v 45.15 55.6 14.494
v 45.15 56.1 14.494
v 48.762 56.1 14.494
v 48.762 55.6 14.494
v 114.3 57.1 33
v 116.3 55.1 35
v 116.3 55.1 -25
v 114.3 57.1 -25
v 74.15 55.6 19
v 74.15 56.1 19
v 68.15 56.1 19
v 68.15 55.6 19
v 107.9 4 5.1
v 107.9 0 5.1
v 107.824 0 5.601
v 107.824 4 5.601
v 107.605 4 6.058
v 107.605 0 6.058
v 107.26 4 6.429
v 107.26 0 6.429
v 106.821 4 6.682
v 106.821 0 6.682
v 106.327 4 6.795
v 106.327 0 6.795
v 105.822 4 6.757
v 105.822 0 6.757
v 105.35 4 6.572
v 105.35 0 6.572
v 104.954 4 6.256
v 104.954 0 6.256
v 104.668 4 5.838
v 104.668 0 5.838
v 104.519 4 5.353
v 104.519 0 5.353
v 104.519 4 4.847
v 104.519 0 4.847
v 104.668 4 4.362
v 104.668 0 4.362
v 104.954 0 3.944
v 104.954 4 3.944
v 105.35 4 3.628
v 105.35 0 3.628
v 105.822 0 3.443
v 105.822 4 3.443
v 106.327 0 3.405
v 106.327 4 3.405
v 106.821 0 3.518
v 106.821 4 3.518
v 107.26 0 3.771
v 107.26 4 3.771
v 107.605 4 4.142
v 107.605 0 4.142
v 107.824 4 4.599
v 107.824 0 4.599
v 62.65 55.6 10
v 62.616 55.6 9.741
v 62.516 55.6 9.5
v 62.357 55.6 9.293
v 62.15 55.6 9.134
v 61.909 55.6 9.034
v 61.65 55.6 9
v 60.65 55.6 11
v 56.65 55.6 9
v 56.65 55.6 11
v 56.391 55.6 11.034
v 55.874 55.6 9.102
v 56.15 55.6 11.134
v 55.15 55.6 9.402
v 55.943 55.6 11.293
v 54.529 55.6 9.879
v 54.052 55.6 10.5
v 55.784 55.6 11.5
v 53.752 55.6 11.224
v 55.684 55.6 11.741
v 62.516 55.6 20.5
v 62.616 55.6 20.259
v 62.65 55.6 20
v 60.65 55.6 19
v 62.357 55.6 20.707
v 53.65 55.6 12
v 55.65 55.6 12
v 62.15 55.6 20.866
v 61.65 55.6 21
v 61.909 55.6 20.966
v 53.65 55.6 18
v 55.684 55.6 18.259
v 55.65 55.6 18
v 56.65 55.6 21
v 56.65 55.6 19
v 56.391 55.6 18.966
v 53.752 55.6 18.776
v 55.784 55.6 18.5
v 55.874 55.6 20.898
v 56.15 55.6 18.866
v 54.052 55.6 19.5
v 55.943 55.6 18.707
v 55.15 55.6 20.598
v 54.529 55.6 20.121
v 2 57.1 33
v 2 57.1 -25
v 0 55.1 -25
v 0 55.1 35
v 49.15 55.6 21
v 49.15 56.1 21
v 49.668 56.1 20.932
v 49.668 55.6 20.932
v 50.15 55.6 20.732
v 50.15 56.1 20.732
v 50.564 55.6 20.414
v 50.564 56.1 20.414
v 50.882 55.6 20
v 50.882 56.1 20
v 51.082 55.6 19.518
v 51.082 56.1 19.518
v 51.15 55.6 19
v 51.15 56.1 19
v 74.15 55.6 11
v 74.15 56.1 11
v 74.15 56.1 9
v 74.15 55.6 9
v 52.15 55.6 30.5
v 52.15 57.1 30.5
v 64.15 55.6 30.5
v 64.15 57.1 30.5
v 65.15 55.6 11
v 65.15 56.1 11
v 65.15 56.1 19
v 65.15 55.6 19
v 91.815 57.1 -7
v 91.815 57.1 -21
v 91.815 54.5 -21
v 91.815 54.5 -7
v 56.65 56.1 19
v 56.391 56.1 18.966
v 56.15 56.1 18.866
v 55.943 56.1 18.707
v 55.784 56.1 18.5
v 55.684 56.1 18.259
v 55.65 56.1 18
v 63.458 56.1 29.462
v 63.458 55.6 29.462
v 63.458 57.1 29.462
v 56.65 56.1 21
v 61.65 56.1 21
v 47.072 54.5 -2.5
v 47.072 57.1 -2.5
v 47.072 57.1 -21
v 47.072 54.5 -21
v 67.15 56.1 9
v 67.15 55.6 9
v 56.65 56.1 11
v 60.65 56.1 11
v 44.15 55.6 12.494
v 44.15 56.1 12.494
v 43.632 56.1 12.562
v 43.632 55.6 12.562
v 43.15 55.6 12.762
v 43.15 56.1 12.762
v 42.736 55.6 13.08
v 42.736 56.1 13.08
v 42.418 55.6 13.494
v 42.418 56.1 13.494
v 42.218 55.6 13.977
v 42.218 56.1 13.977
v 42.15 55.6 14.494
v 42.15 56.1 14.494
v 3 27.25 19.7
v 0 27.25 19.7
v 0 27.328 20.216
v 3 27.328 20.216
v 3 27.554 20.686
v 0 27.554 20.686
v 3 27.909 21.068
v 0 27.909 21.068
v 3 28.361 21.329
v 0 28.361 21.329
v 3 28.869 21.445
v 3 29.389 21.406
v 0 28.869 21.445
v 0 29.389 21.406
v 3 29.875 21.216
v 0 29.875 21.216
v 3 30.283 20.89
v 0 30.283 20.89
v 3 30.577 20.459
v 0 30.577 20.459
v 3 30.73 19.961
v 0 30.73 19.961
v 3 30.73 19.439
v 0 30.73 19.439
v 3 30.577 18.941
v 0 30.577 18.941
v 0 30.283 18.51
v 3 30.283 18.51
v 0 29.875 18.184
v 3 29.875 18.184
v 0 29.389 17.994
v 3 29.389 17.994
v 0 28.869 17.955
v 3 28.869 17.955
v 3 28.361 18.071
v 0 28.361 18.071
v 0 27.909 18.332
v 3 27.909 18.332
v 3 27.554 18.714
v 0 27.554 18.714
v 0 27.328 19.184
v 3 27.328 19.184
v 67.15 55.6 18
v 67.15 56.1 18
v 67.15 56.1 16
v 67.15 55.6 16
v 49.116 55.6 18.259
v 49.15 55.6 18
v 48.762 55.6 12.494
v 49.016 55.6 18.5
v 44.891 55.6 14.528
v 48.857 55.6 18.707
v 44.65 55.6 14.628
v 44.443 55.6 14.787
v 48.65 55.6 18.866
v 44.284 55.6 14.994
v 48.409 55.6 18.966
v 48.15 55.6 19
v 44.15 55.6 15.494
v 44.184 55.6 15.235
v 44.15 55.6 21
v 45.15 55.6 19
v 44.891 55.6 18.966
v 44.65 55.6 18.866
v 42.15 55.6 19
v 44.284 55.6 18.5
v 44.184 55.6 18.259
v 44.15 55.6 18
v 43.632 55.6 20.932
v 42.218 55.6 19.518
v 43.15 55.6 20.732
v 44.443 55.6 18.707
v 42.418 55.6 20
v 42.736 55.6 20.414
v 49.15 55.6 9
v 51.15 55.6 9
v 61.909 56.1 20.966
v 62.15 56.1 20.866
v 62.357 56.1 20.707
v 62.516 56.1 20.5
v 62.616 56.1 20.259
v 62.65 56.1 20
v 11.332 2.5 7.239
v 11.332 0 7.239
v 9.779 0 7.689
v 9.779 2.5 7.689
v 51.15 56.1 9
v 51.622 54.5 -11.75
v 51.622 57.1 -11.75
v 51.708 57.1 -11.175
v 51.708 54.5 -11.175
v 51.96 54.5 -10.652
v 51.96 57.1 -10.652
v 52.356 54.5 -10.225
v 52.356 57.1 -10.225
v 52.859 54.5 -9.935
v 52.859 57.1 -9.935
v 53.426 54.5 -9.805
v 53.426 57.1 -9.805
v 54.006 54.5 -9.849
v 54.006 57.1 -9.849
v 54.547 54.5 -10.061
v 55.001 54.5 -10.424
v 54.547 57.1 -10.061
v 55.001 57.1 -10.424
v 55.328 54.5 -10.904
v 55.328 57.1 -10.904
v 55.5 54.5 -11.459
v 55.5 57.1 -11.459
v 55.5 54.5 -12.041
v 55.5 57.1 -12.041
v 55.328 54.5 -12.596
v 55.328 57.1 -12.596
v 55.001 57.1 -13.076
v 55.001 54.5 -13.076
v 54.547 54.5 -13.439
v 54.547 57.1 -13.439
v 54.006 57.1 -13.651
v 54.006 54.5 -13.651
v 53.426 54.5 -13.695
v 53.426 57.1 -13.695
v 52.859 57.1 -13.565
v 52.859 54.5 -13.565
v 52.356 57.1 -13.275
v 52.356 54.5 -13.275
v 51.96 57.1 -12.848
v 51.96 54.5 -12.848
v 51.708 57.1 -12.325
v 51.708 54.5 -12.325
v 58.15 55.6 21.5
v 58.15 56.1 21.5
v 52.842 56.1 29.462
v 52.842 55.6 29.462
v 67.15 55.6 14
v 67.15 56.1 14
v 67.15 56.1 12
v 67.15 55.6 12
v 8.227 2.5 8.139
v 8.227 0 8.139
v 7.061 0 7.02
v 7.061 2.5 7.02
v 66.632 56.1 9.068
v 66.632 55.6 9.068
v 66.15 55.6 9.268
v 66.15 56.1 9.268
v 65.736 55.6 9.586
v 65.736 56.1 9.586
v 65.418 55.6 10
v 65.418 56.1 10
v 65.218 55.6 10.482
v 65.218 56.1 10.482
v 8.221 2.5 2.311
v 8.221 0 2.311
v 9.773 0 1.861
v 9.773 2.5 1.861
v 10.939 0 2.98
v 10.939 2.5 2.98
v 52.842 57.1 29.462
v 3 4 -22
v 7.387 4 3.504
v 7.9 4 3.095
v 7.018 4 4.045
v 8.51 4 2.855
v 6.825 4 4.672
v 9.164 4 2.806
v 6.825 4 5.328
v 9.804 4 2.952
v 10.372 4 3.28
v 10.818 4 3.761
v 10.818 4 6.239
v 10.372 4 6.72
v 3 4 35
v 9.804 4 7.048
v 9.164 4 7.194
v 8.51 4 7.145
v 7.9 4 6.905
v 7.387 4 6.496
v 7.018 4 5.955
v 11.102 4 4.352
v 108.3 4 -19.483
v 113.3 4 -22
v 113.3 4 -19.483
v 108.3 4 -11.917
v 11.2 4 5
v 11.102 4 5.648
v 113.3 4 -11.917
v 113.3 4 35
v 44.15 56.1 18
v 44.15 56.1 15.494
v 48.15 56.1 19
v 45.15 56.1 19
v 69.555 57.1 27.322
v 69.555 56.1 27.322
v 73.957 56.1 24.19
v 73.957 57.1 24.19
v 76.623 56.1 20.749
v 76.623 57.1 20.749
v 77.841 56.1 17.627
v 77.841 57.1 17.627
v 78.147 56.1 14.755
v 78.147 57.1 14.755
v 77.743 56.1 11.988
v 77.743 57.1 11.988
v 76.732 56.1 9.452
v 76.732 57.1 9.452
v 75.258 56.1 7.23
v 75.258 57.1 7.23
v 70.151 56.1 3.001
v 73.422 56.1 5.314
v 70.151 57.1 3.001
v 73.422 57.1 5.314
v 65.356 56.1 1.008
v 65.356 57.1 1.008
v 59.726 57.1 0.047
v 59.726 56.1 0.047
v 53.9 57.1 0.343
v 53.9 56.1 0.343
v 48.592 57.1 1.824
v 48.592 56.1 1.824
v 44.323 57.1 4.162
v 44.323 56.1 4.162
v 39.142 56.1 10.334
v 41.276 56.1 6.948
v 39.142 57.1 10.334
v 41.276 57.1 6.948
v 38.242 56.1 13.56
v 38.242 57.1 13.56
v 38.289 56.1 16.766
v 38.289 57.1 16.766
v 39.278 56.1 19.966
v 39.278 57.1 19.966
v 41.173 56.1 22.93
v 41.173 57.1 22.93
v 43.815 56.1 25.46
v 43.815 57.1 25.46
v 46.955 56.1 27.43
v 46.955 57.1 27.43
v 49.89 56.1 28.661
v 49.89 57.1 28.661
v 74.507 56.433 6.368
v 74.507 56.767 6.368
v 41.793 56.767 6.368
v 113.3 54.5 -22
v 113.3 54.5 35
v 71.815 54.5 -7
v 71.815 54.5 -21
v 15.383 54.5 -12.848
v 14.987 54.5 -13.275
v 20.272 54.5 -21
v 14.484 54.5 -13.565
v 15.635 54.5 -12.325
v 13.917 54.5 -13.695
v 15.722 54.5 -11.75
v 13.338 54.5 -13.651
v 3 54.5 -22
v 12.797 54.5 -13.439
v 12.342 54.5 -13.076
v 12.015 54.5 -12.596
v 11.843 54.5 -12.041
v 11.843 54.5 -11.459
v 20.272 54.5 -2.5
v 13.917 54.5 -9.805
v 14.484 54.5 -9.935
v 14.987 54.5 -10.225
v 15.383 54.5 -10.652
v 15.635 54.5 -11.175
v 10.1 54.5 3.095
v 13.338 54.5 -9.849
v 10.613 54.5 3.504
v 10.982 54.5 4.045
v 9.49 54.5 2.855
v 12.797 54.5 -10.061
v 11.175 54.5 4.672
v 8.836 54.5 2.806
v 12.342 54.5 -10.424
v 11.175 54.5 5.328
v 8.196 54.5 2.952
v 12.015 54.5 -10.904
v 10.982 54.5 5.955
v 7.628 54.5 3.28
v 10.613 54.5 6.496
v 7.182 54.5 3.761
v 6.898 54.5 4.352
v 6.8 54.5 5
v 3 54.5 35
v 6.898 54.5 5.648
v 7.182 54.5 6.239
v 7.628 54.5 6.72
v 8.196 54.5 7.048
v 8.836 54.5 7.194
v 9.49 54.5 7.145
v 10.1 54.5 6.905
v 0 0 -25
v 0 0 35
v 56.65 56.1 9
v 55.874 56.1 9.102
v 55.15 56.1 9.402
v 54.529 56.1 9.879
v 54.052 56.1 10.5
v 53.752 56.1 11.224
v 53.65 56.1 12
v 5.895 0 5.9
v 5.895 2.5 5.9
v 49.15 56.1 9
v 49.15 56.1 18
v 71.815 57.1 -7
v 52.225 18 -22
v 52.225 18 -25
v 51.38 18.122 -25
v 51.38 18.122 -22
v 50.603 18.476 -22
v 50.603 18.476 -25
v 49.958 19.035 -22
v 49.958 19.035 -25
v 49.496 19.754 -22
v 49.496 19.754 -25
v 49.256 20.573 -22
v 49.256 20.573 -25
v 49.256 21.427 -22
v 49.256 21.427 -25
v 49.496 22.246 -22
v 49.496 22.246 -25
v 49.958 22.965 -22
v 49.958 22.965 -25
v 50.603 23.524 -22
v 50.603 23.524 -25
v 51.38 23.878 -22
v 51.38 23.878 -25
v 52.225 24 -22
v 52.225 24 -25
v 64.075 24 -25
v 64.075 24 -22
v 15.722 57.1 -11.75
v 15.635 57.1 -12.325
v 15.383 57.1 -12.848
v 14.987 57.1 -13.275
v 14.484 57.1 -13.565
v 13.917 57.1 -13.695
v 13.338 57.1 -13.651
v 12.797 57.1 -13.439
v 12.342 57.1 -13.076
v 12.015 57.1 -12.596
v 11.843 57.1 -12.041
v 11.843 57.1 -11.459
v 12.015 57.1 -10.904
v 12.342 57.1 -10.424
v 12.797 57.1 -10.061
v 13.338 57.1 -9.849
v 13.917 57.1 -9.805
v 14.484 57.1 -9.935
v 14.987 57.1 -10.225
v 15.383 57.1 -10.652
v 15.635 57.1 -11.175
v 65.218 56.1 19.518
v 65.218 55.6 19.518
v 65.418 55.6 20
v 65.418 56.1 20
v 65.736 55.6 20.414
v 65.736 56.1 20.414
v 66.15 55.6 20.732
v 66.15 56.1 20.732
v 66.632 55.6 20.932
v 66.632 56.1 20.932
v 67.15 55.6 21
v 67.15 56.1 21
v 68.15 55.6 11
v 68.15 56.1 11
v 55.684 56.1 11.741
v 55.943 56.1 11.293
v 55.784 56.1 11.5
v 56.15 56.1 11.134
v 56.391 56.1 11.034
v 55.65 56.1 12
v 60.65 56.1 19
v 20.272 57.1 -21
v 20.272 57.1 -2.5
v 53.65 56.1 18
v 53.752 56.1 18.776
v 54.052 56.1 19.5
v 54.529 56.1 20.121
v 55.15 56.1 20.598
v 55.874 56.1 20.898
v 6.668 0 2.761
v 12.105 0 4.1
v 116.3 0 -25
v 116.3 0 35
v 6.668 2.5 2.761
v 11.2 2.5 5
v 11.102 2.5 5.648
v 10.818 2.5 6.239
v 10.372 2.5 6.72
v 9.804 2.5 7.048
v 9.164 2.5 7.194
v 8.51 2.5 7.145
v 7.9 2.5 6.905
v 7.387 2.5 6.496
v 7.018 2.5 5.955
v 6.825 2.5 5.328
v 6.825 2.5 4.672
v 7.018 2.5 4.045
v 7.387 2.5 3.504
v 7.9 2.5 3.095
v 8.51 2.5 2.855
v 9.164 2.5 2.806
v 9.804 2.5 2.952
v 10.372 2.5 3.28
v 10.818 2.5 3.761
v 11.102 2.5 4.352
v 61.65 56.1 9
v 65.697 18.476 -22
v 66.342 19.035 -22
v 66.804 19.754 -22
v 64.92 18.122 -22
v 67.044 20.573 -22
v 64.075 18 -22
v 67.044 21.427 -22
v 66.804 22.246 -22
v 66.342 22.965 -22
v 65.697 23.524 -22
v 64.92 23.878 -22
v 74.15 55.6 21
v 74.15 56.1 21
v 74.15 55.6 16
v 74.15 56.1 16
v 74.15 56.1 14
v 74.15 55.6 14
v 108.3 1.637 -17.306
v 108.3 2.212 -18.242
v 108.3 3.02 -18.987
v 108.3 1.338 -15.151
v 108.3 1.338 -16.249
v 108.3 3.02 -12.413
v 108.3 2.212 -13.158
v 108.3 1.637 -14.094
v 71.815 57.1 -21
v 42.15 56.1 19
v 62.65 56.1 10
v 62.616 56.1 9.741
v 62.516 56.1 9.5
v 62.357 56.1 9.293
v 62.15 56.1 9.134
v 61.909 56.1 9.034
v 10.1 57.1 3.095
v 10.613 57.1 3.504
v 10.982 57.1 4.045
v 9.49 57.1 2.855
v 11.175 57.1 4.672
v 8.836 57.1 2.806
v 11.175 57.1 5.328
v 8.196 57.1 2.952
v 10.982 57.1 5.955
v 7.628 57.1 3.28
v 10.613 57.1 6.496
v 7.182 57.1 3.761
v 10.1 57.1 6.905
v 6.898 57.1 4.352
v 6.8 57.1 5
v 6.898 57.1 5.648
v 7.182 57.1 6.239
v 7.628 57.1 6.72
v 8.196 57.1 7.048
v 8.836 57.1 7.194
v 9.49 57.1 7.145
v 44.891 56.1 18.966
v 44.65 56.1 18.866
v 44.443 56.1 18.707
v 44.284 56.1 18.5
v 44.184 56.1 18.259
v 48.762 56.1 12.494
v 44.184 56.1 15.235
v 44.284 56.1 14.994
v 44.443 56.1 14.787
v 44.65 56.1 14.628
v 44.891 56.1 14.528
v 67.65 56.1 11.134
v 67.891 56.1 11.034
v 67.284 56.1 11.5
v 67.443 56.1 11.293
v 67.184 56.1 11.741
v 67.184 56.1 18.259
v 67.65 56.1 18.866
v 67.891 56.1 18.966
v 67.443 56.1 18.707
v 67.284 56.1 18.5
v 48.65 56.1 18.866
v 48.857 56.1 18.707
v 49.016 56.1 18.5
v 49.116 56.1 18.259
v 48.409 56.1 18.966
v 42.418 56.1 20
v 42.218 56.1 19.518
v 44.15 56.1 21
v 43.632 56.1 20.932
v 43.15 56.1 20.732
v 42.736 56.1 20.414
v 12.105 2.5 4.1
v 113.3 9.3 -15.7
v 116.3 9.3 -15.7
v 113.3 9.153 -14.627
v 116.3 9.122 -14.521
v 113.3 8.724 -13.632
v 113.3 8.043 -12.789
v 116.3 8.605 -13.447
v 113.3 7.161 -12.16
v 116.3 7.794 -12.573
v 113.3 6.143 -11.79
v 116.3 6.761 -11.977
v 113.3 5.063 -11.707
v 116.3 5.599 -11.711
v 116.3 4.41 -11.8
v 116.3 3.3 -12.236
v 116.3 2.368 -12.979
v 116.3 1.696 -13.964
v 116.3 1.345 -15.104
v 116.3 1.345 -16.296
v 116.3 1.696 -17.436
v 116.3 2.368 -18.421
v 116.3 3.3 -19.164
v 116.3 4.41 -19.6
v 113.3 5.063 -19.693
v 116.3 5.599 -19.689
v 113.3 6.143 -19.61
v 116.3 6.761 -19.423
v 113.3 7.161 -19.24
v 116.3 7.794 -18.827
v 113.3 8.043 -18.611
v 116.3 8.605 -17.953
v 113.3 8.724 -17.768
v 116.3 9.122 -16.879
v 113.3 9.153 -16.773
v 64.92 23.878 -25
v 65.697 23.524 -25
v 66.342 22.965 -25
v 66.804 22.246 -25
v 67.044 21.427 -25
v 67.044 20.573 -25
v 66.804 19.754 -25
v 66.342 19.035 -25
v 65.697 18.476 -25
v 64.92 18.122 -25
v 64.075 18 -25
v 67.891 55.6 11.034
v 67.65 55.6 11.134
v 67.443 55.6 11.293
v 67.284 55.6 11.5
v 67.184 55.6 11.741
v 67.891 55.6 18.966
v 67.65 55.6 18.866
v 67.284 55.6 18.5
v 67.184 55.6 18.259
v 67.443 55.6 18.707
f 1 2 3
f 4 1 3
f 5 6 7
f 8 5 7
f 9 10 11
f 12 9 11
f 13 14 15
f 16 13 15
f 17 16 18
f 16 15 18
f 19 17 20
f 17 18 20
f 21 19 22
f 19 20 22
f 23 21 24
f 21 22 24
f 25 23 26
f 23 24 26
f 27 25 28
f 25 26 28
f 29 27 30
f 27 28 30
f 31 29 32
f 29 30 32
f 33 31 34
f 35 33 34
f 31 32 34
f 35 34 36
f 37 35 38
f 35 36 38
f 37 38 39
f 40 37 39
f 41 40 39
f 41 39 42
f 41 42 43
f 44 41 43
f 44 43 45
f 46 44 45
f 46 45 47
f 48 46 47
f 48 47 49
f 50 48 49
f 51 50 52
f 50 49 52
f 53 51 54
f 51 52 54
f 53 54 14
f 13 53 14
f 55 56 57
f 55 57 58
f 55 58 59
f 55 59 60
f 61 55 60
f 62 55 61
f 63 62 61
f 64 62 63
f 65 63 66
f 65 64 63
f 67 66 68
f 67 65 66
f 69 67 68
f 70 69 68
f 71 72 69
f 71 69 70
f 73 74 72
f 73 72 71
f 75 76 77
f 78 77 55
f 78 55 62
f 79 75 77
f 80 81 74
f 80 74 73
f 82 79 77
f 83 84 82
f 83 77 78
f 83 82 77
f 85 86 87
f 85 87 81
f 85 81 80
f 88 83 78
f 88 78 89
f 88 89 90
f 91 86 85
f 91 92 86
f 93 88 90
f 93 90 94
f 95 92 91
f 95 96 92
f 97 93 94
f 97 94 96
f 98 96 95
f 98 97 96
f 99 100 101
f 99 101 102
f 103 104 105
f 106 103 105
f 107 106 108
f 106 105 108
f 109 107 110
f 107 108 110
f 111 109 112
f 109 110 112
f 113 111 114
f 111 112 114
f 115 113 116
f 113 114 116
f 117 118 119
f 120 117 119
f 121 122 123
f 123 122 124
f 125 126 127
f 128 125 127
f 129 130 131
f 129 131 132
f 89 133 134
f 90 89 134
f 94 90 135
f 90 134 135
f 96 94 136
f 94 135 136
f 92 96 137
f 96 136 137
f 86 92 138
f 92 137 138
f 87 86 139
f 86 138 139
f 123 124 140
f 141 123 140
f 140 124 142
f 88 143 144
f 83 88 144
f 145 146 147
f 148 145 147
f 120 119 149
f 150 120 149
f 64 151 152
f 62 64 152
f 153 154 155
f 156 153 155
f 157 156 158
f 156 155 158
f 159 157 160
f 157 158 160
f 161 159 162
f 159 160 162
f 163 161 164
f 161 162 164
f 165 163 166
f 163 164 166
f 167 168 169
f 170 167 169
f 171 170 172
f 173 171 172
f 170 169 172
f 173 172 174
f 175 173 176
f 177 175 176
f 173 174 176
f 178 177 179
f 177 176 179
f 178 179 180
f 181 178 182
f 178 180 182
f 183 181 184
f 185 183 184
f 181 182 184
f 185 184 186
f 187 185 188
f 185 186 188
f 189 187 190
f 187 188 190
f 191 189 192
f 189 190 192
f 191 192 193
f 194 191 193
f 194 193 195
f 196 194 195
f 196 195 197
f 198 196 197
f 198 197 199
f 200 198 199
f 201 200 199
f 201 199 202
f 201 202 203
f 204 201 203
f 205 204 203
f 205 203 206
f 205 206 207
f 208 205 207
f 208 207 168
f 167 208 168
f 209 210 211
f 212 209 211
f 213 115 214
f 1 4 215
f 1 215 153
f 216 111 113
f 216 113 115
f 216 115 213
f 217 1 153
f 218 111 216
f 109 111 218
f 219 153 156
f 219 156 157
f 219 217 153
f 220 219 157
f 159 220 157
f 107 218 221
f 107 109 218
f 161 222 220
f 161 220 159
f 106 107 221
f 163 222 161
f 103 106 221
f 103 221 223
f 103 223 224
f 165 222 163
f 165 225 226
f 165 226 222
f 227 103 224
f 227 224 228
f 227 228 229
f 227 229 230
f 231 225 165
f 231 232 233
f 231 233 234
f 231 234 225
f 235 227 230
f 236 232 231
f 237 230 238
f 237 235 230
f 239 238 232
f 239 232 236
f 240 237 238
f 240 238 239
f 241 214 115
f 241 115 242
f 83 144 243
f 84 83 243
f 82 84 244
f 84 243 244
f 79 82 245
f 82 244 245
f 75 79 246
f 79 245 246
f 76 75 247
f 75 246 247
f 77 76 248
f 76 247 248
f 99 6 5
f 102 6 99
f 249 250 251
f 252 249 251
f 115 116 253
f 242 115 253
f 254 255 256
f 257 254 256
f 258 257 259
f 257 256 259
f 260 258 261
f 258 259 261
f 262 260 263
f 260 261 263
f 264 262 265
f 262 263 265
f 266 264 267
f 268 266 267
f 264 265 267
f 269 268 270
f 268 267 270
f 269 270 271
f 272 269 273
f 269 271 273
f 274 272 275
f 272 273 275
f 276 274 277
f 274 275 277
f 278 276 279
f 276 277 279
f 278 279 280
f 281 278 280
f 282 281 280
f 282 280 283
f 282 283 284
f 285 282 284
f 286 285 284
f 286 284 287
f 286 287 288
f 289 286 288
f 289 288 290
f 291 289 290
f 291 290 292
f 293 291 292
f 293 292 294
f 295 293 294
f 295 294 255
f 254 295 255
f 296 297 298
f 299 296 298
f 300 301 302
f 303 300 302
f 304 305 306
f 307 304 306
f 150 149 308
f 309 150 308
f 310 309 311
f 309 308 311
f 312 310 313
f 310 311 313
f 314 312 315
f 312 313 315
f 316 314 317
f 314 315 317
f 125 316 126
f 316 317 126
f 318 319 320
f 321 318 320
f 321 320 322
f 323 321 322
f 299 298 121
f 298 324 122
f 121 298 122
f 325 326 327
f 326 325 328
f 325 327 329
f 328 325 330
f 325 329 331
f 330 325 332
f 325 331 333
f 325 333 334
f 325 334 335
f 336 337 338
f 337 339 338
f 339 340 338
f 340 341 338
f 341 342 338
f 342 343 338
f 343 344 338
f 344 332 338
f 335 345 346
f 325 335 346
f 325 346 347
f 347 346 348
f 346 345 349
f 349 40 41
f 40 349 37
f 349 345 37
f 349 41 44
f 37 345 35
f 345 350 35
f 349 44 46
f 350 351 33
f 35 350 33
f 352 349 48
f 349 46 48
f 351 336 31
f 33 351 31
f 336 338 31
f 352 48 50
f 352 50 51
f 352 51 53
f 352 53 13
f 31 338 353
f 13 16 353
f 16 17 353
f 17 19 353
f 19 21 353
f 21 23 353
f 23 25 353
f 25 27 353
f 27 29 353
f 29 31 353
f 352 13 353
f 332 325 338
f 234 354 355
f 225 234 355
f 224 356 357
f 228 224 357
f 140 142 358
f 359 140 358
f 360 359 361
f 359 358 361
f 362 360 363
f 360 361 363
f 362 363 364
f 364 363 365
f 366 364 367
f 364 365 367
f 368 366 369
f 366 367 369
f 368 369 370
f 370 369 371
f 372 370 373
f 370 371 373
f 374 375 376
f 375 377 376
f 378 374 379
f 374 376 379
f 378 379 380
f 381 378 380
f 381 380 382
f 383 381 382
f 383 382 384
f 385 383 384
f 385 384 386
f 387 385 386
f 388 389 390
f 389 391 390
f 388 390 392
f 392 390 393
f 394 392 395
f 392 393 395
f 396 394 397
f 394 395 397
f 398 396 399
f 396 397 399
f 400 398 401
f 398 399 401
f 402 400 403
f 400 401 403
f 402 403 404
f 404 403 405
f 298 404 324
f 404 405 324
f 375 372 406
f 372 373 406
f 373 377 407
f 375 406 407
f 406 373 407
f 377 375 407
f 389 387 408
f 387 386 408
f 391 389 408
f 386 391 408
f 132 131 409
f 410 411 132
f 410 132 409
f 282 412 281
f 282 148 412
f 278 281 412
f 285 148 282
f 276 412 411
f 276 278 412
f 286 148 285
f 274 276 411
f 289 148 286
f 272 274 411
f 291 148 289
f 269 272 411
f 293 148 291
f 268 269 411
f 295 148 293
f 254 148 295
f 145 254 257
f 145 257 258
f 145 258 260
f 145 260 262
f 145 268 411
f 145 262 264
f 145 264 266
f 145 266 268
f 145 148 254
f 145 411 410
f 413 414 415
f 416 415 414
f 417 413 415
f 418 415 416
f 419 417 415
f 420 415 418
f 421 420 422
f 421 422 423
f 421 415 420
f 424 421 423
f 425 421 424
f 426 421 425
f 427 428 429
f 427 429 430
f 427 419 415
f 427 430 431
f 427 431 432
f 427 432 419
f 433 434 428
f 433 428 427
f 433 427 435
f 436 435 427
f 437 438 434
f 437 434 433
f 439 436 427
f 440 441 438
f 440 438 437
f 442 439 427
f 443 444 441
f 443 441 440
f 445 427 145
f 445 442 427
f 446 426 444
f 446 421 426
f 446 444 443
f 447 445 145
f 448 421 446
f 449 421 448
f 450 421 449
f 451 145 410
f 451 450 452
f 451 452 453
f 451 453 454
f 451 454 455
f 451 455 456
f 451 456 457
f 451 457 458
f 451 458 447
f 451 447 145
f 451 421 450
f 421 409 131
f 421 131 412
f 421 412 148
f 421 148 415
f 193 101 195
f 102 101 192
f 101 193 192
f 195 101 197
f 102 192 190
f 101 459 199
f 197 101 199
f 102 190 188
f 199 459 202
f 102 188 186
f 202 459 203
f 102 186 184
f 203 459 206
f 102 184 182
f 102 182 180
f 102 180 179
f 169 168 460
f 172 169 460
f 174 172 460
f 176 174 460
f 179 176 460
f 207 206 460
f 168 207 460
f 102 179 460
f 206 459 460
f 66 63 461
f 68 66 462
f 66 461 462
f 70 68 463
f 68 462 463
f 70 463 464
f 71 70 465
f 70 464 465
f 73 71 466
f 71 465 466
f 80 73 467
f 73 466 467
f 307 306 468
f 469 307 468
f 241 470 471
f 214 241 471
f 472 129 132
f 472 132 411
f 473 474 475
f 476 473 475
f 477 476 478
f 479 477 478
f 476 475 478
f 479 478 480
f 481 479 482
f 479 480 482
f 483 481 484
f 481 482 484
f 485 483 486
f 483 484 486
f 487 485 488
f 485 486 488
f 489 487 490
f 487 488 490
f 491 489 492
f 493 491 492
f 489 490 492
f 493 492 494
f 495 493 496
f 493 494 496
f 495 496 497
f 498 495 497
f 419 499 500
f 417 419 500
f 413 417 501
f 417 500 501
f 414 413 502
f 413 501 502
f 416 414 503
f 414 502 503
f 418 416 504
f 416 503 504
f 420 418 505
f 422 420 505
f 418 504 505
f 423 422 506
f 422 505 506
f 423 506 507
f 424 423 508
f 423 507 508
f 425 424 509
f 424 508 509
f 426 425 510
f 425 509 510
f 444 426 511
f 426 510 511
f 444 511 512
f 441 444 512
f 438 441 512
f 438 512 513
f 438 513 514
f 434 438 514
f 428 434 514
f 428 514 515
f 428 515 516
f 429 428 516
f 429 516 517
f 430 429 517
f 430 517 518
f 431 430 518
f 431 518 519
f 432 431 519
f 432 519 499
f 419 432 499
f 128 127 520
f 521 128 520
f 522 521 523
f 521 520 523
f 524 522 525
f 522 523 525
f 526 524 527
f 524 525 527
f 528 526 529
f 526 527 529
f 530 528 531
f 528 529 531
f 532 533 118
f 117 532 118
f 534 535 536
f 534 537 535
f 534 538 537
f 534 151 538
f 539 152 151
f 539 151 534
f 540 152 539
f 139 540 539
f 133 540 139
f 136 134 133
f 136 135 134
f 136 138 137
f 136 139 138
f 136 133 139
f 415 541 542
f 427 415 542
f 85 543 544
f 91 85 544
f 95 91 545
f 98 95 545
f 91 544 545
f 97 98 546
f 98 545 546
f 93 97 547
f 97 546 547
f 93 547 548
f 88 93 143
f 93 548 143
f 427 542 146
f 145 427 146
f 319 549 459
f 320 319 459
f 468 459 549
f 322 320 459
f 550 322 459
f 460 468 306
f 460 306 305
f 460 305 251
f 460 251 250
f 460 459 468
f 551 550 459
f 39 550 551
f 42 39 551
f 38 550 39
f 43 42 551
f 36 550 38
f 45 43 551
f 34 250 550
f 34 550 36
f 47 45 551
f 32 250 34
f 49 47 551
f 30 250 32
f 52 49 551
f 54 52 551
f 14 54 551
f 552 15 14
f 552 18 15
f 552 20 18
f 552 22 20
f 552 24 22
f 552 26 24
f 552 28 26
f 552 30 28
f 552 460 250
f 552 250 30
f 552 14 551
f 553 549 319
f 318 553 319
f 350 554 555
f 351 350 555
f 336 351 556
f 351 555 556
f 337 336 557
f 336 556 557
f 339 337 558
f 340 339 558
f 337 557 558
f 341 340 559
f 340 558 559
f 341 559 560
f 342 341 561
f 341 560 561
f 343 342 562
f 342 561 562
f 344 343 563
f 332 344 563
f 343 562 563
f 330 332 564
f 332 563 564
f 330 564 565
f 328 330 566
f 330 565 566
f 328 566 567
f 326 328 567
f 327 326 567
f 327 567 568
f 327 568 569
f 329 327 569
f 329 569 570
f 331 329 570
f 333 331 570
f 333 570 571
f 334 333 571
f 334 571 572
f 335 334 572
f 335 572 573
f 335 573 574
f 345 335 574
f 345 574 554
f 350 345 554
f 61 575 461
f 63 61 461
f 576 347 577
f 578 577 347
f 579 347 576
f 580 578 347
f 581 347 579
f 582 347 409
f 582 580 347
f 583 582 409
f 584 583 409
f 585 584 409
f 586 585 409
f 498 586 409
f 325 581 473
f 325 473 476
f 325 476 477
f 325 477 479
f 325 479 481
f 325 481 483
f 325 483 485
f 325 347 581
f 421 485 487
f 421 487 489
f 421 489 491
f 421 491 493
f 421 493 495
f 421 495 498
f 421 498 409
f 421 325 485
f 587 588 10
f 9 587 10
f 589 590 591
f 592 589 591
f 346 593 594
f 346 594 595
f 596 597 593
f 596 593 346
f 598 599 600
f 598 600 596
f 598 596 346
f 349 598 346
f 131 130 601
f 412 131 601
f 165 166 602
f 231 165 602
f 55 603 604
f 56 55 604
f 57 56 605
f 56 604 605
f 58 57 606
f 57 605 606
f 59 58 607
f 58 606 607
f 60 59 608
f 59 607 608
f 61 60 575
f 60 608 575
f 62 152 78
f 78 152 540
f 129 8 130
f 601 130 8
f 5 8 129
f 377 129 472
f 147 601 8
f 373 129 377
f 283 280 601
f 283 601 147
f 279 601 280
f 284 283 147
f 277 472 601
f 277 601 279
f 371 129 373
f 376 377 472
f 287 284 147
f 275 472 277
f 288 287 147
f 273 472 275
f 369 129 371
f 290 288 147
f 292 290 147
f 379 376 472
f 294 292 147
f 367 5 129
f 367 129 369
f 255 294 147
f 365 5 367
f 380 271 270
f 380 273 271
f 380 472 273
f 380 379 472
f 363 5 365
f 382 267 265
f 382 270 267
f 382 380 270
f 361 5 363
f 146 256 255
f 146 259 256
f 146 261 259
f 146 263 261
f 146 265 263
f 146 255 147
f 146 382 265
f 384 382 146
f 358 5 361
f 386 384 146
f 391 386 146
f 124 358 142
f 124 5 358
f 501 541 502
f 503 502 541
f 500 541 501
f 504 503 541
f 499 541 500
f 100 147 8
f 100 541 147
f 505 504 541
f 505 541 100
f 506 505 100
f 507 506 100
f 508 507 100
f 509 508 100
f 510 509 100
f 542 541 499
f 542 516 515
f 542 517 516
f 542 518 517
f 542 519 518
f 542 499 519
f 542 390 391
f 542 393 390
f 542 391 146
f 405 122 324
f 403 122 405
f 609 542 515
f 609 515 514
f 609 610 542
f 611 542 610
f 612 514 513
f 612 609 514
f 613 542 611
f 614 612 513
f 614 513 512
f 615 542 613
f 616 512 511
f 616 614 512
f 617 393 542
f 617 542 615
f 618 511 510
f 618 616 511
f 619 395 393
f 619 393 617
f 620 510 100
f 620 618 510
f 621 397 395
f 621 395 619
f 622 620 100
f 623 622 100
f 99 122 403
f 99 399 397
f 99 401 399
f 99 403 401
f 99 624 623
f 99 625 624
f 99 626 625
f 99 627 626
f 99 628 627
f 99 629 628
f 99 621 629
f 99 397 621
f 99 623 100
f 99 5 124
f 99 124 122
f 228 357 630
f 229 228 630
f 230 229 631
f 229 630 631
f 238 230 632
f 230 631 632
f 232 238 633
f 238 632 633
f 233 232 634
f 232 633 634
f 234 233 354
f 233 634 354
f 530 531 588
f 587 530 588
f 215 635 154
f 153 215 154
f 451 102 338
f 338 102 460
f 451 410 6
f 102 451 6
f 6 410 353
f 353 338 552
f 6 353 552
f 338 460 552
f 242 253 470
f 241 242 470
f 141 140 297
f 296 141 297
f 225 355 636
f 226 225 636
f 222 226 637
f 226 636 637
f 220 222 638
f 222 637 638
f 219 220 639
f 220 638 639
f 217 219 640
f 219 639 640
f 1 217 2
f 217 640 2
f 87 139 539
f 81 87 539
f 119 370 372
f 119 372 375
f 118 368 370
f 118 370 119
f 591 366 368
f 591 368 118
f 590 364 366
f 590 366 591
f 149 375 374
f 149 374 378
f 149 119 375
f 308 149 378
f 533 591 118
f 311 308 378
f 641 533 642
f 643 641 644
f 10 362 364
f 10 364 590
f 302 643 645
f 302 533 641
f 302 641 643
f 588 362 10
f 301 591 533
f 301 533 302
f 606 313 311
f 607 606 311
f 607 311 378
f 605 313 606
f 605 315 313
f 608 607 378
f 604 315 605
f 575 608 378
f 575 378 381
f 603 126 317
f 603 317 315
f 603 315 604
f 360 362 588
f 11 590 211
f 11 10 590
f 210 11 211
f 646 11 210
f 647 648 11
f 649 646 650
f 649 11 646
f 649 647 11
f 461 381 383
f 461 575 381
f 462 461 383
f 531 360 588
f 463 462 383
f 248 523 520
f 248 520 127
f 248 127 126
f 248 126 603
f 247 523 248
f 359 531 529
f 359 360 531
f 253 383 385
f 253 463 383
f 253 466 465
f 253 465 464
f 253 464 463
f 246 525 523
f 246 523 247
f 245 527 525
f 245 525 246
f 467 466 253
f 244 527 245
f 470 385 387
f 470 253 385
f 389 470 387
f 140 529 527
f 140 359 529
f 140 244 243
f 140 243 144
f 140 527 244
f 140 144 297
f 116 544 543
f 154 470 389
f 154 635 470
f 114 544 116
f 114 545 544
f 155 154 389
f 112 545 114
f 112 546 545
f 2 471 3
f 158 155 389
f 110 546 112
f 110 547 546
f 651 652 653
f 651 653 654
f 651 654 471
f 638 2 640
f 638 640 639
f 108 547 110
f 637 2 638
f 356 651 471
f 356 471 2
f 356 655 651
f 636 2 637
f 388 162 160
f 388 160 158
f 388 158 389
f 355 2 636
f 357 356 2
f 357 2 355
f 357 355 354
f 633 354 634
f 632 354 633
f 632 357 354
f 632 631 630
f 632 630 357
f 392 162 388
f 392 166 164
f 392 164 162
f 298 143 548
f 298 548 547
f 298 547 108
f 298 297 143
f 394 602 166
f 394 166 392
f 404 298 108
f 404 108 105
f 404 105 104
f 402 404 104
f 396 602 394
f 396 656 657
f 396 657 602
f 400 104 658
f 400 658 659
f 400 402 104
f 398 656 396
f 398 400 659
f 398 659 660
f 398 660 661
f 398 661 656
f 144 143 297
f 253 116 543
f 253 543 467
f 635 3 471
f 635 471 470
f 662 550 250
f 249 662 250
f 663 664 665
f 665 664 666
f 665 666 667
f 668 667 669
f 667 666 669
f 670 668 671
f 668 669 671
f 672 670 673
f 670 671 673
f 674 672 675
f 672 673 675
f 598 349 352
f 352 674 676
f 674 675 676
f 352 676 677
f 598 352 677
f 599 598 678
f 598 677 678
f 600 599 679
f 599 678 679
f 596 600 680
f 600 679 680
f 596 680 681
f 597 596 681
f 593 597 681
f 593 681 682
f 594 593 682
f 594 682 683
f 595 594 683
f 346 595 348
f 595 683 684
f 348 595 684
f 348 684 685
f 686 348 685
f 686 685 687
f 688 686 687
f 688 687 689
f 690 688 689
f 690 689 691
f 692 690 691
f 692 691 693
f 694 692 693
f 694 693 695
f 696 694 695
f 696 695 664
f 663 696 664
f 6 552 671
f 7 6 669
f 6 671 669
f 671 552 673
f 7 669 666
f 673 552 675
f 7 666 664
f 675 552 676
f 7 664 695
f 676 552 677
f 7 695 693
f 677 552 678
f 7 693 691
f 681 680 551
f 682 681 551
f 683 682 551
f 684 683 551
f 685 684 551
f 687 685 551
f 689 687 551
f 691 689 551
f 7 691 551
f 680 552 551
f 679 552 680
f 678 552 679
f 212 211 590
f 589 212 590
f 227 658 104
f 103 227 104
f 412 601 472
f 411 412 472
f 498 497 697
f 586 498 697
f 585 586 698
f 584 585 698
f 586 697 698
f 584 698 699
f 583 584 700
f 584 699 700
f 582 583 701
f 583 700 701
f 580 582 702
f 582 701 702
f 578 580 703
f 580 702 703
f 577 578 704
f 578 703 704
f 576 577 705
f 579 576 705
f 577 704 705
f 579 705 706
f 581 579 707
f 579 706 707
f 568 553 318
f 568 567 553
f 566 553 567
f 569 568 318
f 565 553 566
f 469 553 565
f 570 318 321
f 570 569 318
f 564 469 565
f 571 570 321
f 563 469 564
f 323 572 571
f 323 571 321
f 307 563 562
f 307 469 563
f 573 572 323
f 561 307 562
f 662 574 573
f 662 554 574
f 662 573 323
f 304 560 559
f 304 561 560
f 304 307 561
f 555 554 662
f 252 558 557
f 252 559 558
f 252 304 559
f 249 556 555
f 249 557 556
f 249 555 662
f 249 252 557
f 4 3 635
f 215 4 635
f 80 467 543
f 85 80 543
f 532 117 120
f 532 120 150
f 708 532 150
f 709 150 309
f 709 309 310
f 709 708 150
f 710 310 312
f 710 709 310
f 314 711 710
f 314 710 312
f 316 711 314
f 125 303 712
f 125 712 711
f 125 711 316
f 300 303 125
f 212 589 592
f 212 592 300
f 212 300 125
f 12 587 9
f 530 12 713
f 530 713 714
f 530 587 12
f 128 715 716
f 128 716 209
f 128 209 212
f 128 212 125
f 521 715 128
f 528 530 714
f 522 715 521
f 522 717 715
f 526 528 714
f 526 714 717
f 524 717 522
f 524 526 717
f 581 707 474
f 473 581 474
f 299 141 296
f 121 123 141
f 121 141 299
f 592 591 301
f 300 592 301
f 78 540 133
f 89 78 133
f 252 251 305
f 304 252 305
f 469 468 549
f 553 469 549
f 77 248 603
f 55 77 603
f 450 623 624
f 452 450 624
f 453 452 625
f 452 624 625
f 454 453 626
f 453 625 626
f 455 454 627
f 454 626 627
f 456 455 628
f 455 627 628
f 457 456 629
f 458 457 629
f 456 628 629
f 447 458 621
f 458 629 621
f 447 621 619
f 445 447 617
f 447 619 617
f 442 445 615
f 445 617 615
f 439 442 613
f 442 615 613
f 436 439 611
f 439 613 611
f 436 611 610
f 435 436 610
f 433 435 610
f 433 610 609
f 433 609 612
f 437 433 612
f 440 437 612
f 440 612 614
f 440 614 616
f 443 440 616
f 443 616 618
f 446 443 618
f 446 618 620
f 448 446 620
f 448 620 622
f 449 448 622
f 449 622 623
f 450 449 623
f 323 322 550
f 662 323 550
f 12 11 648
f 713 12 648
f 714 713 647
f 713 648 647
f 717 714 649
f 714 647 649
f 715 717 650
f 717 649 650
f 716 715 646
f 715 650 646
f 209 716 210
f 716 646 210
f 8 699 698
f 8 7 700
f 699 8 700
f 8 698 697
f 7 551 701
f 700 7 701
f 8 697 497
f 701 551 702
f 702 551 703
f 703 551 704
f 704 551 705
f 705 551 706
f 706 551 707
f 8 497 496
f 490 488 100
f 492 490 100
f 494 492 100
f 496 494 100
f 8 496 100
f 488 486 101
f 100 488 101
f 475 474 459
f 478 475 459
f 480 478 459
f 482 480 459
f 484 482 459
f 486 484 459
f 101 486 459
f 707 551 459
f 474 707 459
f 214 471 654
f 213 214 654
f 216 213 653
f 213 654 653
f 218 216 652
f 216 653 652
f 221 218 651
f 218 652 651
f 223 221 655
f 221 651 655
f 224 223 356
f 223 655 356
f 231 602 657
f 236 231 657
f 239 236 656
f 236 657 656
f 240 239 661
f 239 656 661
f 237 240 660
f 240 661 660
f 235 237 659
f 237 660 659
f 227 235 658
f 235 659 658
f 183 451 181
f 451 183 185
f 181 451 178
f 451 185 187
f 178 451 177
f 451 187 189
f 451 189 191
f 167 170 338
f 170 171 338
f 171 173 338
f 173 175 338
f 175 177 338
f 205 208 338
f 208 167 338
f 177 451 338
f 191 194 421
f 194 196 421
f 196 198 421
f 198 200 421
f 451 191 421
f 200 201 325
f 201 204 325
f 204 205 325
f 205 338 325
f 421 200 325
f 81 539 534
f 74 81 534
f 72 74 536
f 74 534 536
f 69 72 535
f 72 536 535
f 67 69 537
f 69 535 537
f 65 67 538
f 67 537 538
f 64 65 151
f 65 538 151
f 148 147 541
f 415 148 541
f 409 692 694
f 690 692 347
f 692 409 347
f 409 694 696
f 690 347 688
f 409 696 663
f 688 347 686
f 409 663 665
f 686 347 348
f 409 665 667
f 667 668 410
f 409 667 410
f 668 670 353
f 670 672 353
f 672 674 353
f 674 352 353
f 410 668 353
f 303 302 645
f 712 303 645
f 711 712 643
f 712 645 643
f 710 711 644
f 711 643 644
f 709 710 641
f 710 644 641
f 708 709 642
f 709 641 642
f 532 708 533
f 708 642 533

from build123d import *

# Parameters (mm, degrees)
F0_W      = 116.3
F0_H      = 70
F0_R      = 2.2
F0_R_2    = 1.7
F1_DEPTH  = 4
F3_DEPTH  = 53.1
F5_DEPTH  = 116.3
F6_R      = 1.95
F6_W      = 20
F6_H      = 14
F7_DEPTH  = 25
F8_R      = 1.75
F9_DEPTH  = 25
F10_W     = 116.3
F10_H     = 35
F11_DEPTH = 25
F13_DEPTH = 1.5
F15_DEPTH = 1
F16_DEPTH = 1
F18_DEPTH = 1.5
F20_DEPTH = 25
F21_SIZE  = 2
F23_DEPTH = 2.5
F24_R     = 1.7
F24_R_2   = 2.2
F25_DEPTH = 25
F26_R     = 4
F27_DEPTH = 8


with BuildPart() as f1:
    # F0 (on Front) → F1 (new body)
    with BuildSketch(Plane.XZ):
        with Locations((58.15, 35)):
            Rectangle(F0_W, F0_H)
        with Locations((9, 5)):
            Circle(F0_R, mode=Mode.SUBTRACT)
        with Locations((106.2, 5.1)):
            Circle(F0_R_2, mode=Mode.SUBTRACT)
        with Locations((18, 61.5)):
            Circle(F0_R_2, mode=Mode.SUBTRACT)
        with Locations((103.3, 61.5)):
            Circle(F0_R_2, mode=Mode.SUBTRACT)
    extrude(amount=-F1_DEPTH)

    # F2 (on face) → F3 (join)
    with BuildSketch(Plane(origin=(0, 4, 0), x_dir=(-1, 0, 0), z_dir=(0, 1, 0))):
        Polygon((-113.3, 35), (-116.3, 35), (-116.3, 0), (-116.3, -25), (-113.3, -25), (-113.3, 0), align=None)
        Polygon((0, 0), (0, 35), (-3, 35), (-3, 0), (-3, -25), (0, -25), align=None)
    extrude(amount=F3_DEPTH)

    # F4 (on face) → F5 (join)
    with BuildSketch(Plane(origin=(0, 0, 0), x_dir=(0, -1, 0), z_dir=(-1, 0, 0))):
        Polygon((-54.5, 35), (-57.1, 35), (-57.1, -25), (0, -25), (0, 0), (-4, 0), (-4, -22), (-54.5, -22), align=None)
    extrude(amount=-F5_DEPTH)

    # F6 (on face) → F7 (cut)
    with BuildSketch(Plane(origin=(0, 57.1, 0), x_dir=(-1, 0, 0), z_dir=(0, 1, 0))):
        with BuildLine():
            ThreePointArc((-11.8216082234, -11.75), (-13.7716082234, -9.8), (-15.7216082234, -11.75))
            ThreePointArc((-15.7216082234, -11.75), (-13.7716082234, -13.7), (-11.8216082234, -11.75))
        make_face()
        Polygon((-20.2716082234, -2.5), (-47.0716082234, -2.5), (-47.0716082234, -21), (-20.2716082234, -21), (-20.2716082234, -11.75), align=None)
        with Locations((-53.5716082234, -11.75)):
            Circle(F6_R)
        with Locations((-81.8145924807, -14)):
            Rectangle(F6_W, F6_H)
    extrude(amount=-F7_DEPTH, mode=Mode.SUBTRACT)

    # F8 (on face) → F9 (cut)
    with BuildSketch(Plane(origin=(0, 0, 0), x_dir=(0, -1, 0), z_dir=(-1, 0, 0))):
        with Locations((-29, 19.7)):
            Circle(F8_R)
    extrude(amount=-F9_DEPTH, mode=Mode.SUBTRACT)

    # F10 (on face) → F11 (cut)
    with BuildSketch(Plane(origin=(0, 4, 0), x_dir=(-1, 0, 0), z_dir=(0, 1, 0))):
        with Locations((-58.15, 52.5)):
            Rectangle(F10_W, F10_H)
    extrude(amount=-F11_DEPTH, mode=Mode.SUBTRACT)

    # F12 (on face) → F13 (cut)
    with BuildSketch(Plane(origin=(0, 57.1, 0), x_dir=(-1, 0, 0), z_dir=(0, 1, 0))):
        with BuildLine():
            Line((-67.15, 21), (-74.15, 21))
            Line((-74.15, 21), (-74.15, 19))
            Line((-74.15, 19), (-68.15, 19))
            ThreePointArc((-68.15, 19), (-67.4428932188, 18.7071067812), (-67.15, 18))
            Line((-67.15, 18), (-67.15, 16))
            Line((-67.15, 16), (-74.15, 16))
            Line((-74.15, 16), (-74.15, 14))
            Line((-74.15, 14), (-67.15, 14))
            Line((-67.15, 14), (-67.15, 12))
            ThreePointArc((-67.15, 12), (-67.4428932188, 11.2928932188), (-68.15, 11))
            Line((-68.15, 11), (-74.15, 11))
            Line((-74.15, 11), (-74.15, 9))
            Line((-74.15, 9), (-67.15, 9))
            ThreePointArc((-67.15, 9), (-65.7357864376, 9.5857864376), (-65.15, 11))
            Line((-65.15, 11), (-65.15, 19))
            ThreePointArc((-65.15, 19), (-65.7357864376, 20.4142135624), (-67.15, 21))
        make_face()
        with BuildLine():
            Line((-56.65, 21), (-61.65, 21))
            ThreePointArc((-61.65, 21), (-62.3571067812, 20.7071067812), (-62.65, 20))
            Line((-62.65, 20), (-62.65, 10))
            ThreePointArc((-62.65, 10), (-62.3571067812, 9.2928932188), (-61.65, 9))
            Line((-61.65, 9), (-56.65, 9))
            ThreePointArc((-56.65, 9), (-54.5286796564, 9.8786796564), (-53.65, 12))
            Line((-53.65, 12), (-53.65, 18))
            ThreePointArc((-53.65, 18), (-54.5286796564, 20.1213203436), (-56.65, 21))
        make_face()
        with BuildLine():
            Line((-60.649998486, 11.000001514), (-60.649998486, 18.999998486))
            Line((-60.649998486, 18.999998486), (-56.65, 18.999998486))
            ThreePointArc((-56.65, 18.999998486), (-55.9428942893, 18.7071057107), (-55.650001514, 18))
            Line((-55.650001514, 18), (-55.650001514, 12))
            ThreePointArc((-55.650001514, 12), (-55.9428942893, 11.2928942893), (-56.65, 11.000001514))
            Line((-56.65, 11.000001514), (-60.649998486, 11.000001514))
        make_face(mode=Mode.SUBTRACT)
        with BuildLine():
            Line((-44.15, 21), (-49.15, 21))
            ThreePointArc((-49.15, 21), (-50.5642135624, 20.4142135624), (-51.15, 19))
            Line((-51.15, 19), (-51.15, 9))
            Line((-51.15, 9), (-49.15, 9))
            Line((-49.15, 9), (-49.15, 18))
            ThreePointArc((-49.15, 18), (-48.8571067812, 18.7071067812), (-48.15, 19))
            Line((-48.15, 19), (-45.15, 19))
            ThreePointArc((-45.15, 19), (-44.4428932188, 18.7071067812), (-44.15, 18))
            Line((-44.15, 18), (-44.15, 15.494282797))
            ThreePointArc((-44.15, 15.494282797), (-44.4428932188, 14.7871760158), (-45.15, 14.494282797))
            Line((-45.15, 14.494282797), (-47.962191087, 14.494282797))
            Line((-47.962191087, 14.494282797), (-48.762191087, 14.494282797))
            Line((-48.762191087, 14.494282797), (-48.762191087, 12.494282797))
            Line((-48.762191087, 12.494282797), (-47.8750728071, 12.494282797))
            Line((-47.8750728071, 12.494282797), (-44.15, 12.494282797))
            ThreePointArc((-44.15, 12.494282797), (-42.7357864376, 13.0800692346), (-42.15, 14.494282797))
            Line((-42.15, 14.494282797), (-42.15, 19))
            ThreePointArc((-42.15, 19), (-42.7357864376, 20.4142135624), (-44.15, 21))
        make_face()
    extrude(amount=-F13_DEPTH, mode=Mode.SUBTRACT)

    # F14 (on face) → F15 (cut)
    with BuildSketch(Plane(origin=(0, 57.1, 0), x_dir=(-1, 0, 0), z_dir=(0, 1, 0))):
        with BuildLine():
            Line((-58.15, 21.5), (-63.4580444713, 29.462066707))
            add(Edge.make_bspline(
                [(-63.4580444713, 29.462066707), (-90.8638269236, 23.8039887729), (-74.5069134618, 6.3684356935), (-58.15, -11.0671173859), (-41.7930865382, 6.3684356935), (-25.4361730764, 23.8039887729), (-52.8419555287, 29.462066707)],
                knots=[4.9810100635, 4.9810100635, 4.9810100635, 6.8963244438, 6.8963244438, 8.8116388241, 8.8116388241, 10.7269532044, 10.7269532044, 10.7269532044], degree=2, weights=[1, 0.5754376204, 1, 0.5754376204, 1, 0.5754376204, 1]))
            Line((-52.8419555287, 29.462066707), (-58.15, 21.5))
        make_face()
        with BuildLine():
            Line((-74.15, 19), (-74.15, 21))
            Line((-74.15, 21), (-67.15, 21))
            ThreePointArc((-67.15, 21), (-65.7357864376, 20.4142135624), (-65.15, 19))
            Line((-65.15, 19), (-65.15, 11))
            ThreePointArc((-65.15, 11), (-65.7357864376, 9.5857864376), (-67.15, 9))
            Line((-67.15, 9), (-74.15, 9))
            Line((-74.15, 9), (-74.15, 11))
            Line((-74.15, 11), (-68.15, 11))
            ThreePointArc((-68.15, 11), (-67.4428932188, 11.2928932188), (-67.15, 12))
            Line((-67.15, 12), (-67.15, 14))
            Line((-67.15, 14), (-74.15, 14))
            Line((-74.15, 14), (-74.15, 16))
            Line((-74.15, 16), (-67.15, 16))
            Line((-67.15, 16), (-67.15, 18))
            ThreePointArc((-67.15, 18), (-67.4428932188, 18.7071067812), (-68.15, 19))
            Line((-68.15, 19), (-74.15, 19))
        make_face(mode=Mode.SUBTRACT)
        with BuildLine():
            ThreePointArc((-62.65, 20), (-62.3571067812, 20.7071067812), (-61.65, 21))
            Line((-61.65, 21), (-56.65, 21))
            ThreePointArc((-56.65, 21), (-54.5286796564, 20.1213203436), (-53.65, 18))
            Line((-53.65, 18), (-53.65, 12))
            ThreePointArc((-53.65, 12), (-54.5286796564, 9.8786796564), (-56.65, 9))
            Line((-56.65, 9), (-61.65, 9))
            ThreePointArc((-61.65, 9), (-62.3571067812, 9.2928932188), (-62.65, 10))
            Line((-62.65, 10), (-62.65, 20))
        make_face(mode=Mode.SUBTRACT)
        with BuildLine():
            ThreePointArc((-51.15, 19), (-50.5642135624, 20.4142135624), (-49.15, 21))
            Line((-49.15, 21), (-44.15, 21))
            ThreePointArc((-44.15, 21), (-42.7357864376, 20.4142135624), (-42.15, 19))
            Line((-42.15, 19), (-42.15, 14.494282797))
            ThreePointArc((-42.15, 14.494282797), (-42.7357864376, 13.0800692346), (-44.15, 12.494282797))
            Line((-44.15, 12.494282797), (-47.8750728071, 12.494282797))
            Line((-47.8750728071, 12.494282797), (-48.762191087, 12.494282797))
            Line((-48.762191087, 12.494282797), (-48.762191087, 14.494282797))
            Line((-48.762191087, 14.494282797), (-47.962191087, 14.494282797))
            Line((-47.962191087, 14.494282797), (-45.15, 14.494282797))
            ThreePointArc((-45.15, 14.494282797), (-44.4428932188, 14.7871760158), (-44.15, 15.494282797))
            Line((-44.15, 15.494282797), (-44.15, 18))
            ThreePointArc((-44.15, 18), (-44.4428932188, 18.7071067812), (-45.15, 19))
            Line((-45.15, 19), (-48.15, 19))
            ThreePointArc((-48.15, 19), (-48.8571067812, 18.7071067812), (-49.15, 18))
            Line((-49.15, 18), (-49.15, 9))
            Line((-49.15, 9), (-51.15, 9))
            Line((-51.15, 9), (-51.15, 19))
        make_face(mode=Mode.SUBTRACT)
    extrude(amount=-F15_DEPTH, mode=Mode.SUBTRACT)

    # F16 (cut): a face of the model
    f16_faces = [f1.faces().sort_by_distance(p)[0] for p in [
        (58.1746933701, 57.1, 15),
    ]]
    extrude(f16_faces, amount=-F16_DEPTH, mode=Mode.SUBTRACT)

    # F17 (on face) → F18 (cut)
    with BuildSketch(Plane(origin=(0, 57.1, 0), x_dir=(-1, 0, 0), z_dir=(0, 1, 0))):
        Polygon((-52.15, 30.5), (-58.15, 30.5), (-64.15, 30.5), (-63.4580444713, 29.462066707), (-58.15, 21.5), (-52.8419555287, 29.462066707), align=None)
    extrude(amount=-F18_DEPTH, mode=Mode.SUBTRACT)

    # F19 (on face) → F20 (cut)
    with BuildSketch(Plane(origin=(0, 0, -25), x_dir=(1, 0, 0), z_dir=(0, 0, -1))):
        with BuildLine():
            ThreePointArc((52.225, -18), (49.225, -21), (52.225, -24))
            Line((52.225, -24), (64.075, -24))
            ThreePointArc((64.075, -24), (67.075, -21), (64.075, -18))
            Line((64.075, -18), (52.225, -18))
        make_face()
    extrude(amount=-F20_DEPTH, mode=Mode.SUBTRACT)

    # F21
    f21_edges = [f1.edges().sort_by_distance(p)[0] for p in [
        (116.3, 57.1, 5),
        (0, 57.1, 5),
        (58.15, 57.1, 35),
    ]]
    chamfer(f21_edges, length=F21_SIZE)

    # F22 (on face) → F23 (cut)
    with BuildSketch(Plane.XZ):
        with BuildLine():
            ThreePointArc((10.9393832885, 2.980397945), (11.5758758906, 3.9023373031), (11.8, 5))
            ThreePointArc((11.8, 5), (11.7796053064, 5.3373341677), (11.7187183281, 5.6697541732))
            ThreePointArc((11.7187183281, 5.6697541732), (11.0196020537, 6.9393832898), (9.7793350426, 7.6893562225))
            ThreePointArc((9.7793350426, 7.6893562225), (8.3302458687, 7.7187183384), (7.0606167648, 7.0196021062))
            ThreePointArc((7.0606167648, 7.0196021062), (6.3106437866, 5.7793350738), (6.2812816719, 4.3302458268))
            ThreePointArc((6.2812816719, 4.3302458268), (6.9803979463, 3.0606167102), (8.2206649574, 2.3106437775))
            ThreePointArc((8.2206649574, 2.3106437775), (9.6697541672, 2.2812816704), (10.9393832885, 2.980397945))
        make_face()
        with BuildLine():
            ThreePointArc((11.7187183281, 5.6697541732), (11.7796053064, 5.3373341677), (11.8, 5))
            ThreePointArc((11.8, 5), (11.5758758906, 3.9023373031), (10.9393832885, 2.980397945))
            Line((10.9393832885, 2.980397945), (12.1054010644, 4.1001013597))
            Line((12.1054010644, 4.1001013597), (11.7187183281, 5.6697541732))
        make_face()
        with BuildLine():
            ThreePointArc((9.7793350426, 7.6893562225), (11.0196020537, 6.9393832898), (11.7187183281, 5.6697541732))
            Line((11.7187183281, 5.6697541732), (11.3320356155, 7.2394068905))
            Line((11.3320356155, 7.2394068905), (9.7793350426, 7.6893562225))
        make_face()
        with BuildLine():
            Line((9.7733654488, 1.8606944692), (10.9393832885, 2.980397945))
            ThreePointArc((10.9393832885, 2.980397945), (9.6697541672, 2.2812816704), (8.2206649574, 2.3106437775))
            Line((8.2206649574, 2.3106437775), (9.7733654488, 1.8606944692))
        make_face()
        with BuildLine():
            ThreePointArc((7.0606167648, 7.0196021062), (8.3302458687, 7.7187183384), (9.7793350426, 7.6893562225))
            Line((9.7793350426, 7.6893562225), (8.2266345512, 8.1393055308))
            Line((8.2266345512, 8.1393055308), (7.0606167648, 7.0196021062))
        make_face()
        with BuildLine():
            Line((6.6679643845, 2.7605931095), (8.2206649574, 2.3106437775))
            ThreePointArc((8.2206649574, 2.3106437775), (6.9803979463, 3.0606167102), (6.2812816719, 4.3302458268))
            Line((6.2812816719, 4.3302458268), (6.6679643845, 2.7605931095))
        make_face()
        with BuildLine():
            ThreePointArc((6.2812816719, 4.3302458268), (6.3106437866, 5.7793350738), (7.0606167648, 7.0196021062))
            Line((7.0606167648, 7.0196021062), (5.8945989356, 5.8998986403))
            Line((5.8945989356, 5.8998986403), (6.2812816719, 4.3302458268))
        make_face()
    extrude(amount=-F23_DEPTH, mode=Mode.SUBTRACT)

    # F24 (on face) → F25 (cut)
    with BuildSketch(Plane(origin=(0, 57.1, 0), x_dir=(-1, 0, 0), z_dir=(0, 1, 0))):
        with Locations((-18, 61.5)):
            Circle(F24_R)
        with Locations((-103.3, 61.5)):
            Circle(F24_R)
        with Locations((-9, 5)):
            Circle(F24_R_2)
    extrude(amount=-F25_DEPTH, mode=Mode.SUBTRACT)

    # F26 (on face) → F27 (cut)
    with BuildSketch(Plane.YZ.offset(116.3)):
        with Locations((5.3, -15.7)):
            Circle(F26_R)
    extrude(amount=-F27_DEPTH, mode=Mode.SUBTRACT)


solid = f1.part
